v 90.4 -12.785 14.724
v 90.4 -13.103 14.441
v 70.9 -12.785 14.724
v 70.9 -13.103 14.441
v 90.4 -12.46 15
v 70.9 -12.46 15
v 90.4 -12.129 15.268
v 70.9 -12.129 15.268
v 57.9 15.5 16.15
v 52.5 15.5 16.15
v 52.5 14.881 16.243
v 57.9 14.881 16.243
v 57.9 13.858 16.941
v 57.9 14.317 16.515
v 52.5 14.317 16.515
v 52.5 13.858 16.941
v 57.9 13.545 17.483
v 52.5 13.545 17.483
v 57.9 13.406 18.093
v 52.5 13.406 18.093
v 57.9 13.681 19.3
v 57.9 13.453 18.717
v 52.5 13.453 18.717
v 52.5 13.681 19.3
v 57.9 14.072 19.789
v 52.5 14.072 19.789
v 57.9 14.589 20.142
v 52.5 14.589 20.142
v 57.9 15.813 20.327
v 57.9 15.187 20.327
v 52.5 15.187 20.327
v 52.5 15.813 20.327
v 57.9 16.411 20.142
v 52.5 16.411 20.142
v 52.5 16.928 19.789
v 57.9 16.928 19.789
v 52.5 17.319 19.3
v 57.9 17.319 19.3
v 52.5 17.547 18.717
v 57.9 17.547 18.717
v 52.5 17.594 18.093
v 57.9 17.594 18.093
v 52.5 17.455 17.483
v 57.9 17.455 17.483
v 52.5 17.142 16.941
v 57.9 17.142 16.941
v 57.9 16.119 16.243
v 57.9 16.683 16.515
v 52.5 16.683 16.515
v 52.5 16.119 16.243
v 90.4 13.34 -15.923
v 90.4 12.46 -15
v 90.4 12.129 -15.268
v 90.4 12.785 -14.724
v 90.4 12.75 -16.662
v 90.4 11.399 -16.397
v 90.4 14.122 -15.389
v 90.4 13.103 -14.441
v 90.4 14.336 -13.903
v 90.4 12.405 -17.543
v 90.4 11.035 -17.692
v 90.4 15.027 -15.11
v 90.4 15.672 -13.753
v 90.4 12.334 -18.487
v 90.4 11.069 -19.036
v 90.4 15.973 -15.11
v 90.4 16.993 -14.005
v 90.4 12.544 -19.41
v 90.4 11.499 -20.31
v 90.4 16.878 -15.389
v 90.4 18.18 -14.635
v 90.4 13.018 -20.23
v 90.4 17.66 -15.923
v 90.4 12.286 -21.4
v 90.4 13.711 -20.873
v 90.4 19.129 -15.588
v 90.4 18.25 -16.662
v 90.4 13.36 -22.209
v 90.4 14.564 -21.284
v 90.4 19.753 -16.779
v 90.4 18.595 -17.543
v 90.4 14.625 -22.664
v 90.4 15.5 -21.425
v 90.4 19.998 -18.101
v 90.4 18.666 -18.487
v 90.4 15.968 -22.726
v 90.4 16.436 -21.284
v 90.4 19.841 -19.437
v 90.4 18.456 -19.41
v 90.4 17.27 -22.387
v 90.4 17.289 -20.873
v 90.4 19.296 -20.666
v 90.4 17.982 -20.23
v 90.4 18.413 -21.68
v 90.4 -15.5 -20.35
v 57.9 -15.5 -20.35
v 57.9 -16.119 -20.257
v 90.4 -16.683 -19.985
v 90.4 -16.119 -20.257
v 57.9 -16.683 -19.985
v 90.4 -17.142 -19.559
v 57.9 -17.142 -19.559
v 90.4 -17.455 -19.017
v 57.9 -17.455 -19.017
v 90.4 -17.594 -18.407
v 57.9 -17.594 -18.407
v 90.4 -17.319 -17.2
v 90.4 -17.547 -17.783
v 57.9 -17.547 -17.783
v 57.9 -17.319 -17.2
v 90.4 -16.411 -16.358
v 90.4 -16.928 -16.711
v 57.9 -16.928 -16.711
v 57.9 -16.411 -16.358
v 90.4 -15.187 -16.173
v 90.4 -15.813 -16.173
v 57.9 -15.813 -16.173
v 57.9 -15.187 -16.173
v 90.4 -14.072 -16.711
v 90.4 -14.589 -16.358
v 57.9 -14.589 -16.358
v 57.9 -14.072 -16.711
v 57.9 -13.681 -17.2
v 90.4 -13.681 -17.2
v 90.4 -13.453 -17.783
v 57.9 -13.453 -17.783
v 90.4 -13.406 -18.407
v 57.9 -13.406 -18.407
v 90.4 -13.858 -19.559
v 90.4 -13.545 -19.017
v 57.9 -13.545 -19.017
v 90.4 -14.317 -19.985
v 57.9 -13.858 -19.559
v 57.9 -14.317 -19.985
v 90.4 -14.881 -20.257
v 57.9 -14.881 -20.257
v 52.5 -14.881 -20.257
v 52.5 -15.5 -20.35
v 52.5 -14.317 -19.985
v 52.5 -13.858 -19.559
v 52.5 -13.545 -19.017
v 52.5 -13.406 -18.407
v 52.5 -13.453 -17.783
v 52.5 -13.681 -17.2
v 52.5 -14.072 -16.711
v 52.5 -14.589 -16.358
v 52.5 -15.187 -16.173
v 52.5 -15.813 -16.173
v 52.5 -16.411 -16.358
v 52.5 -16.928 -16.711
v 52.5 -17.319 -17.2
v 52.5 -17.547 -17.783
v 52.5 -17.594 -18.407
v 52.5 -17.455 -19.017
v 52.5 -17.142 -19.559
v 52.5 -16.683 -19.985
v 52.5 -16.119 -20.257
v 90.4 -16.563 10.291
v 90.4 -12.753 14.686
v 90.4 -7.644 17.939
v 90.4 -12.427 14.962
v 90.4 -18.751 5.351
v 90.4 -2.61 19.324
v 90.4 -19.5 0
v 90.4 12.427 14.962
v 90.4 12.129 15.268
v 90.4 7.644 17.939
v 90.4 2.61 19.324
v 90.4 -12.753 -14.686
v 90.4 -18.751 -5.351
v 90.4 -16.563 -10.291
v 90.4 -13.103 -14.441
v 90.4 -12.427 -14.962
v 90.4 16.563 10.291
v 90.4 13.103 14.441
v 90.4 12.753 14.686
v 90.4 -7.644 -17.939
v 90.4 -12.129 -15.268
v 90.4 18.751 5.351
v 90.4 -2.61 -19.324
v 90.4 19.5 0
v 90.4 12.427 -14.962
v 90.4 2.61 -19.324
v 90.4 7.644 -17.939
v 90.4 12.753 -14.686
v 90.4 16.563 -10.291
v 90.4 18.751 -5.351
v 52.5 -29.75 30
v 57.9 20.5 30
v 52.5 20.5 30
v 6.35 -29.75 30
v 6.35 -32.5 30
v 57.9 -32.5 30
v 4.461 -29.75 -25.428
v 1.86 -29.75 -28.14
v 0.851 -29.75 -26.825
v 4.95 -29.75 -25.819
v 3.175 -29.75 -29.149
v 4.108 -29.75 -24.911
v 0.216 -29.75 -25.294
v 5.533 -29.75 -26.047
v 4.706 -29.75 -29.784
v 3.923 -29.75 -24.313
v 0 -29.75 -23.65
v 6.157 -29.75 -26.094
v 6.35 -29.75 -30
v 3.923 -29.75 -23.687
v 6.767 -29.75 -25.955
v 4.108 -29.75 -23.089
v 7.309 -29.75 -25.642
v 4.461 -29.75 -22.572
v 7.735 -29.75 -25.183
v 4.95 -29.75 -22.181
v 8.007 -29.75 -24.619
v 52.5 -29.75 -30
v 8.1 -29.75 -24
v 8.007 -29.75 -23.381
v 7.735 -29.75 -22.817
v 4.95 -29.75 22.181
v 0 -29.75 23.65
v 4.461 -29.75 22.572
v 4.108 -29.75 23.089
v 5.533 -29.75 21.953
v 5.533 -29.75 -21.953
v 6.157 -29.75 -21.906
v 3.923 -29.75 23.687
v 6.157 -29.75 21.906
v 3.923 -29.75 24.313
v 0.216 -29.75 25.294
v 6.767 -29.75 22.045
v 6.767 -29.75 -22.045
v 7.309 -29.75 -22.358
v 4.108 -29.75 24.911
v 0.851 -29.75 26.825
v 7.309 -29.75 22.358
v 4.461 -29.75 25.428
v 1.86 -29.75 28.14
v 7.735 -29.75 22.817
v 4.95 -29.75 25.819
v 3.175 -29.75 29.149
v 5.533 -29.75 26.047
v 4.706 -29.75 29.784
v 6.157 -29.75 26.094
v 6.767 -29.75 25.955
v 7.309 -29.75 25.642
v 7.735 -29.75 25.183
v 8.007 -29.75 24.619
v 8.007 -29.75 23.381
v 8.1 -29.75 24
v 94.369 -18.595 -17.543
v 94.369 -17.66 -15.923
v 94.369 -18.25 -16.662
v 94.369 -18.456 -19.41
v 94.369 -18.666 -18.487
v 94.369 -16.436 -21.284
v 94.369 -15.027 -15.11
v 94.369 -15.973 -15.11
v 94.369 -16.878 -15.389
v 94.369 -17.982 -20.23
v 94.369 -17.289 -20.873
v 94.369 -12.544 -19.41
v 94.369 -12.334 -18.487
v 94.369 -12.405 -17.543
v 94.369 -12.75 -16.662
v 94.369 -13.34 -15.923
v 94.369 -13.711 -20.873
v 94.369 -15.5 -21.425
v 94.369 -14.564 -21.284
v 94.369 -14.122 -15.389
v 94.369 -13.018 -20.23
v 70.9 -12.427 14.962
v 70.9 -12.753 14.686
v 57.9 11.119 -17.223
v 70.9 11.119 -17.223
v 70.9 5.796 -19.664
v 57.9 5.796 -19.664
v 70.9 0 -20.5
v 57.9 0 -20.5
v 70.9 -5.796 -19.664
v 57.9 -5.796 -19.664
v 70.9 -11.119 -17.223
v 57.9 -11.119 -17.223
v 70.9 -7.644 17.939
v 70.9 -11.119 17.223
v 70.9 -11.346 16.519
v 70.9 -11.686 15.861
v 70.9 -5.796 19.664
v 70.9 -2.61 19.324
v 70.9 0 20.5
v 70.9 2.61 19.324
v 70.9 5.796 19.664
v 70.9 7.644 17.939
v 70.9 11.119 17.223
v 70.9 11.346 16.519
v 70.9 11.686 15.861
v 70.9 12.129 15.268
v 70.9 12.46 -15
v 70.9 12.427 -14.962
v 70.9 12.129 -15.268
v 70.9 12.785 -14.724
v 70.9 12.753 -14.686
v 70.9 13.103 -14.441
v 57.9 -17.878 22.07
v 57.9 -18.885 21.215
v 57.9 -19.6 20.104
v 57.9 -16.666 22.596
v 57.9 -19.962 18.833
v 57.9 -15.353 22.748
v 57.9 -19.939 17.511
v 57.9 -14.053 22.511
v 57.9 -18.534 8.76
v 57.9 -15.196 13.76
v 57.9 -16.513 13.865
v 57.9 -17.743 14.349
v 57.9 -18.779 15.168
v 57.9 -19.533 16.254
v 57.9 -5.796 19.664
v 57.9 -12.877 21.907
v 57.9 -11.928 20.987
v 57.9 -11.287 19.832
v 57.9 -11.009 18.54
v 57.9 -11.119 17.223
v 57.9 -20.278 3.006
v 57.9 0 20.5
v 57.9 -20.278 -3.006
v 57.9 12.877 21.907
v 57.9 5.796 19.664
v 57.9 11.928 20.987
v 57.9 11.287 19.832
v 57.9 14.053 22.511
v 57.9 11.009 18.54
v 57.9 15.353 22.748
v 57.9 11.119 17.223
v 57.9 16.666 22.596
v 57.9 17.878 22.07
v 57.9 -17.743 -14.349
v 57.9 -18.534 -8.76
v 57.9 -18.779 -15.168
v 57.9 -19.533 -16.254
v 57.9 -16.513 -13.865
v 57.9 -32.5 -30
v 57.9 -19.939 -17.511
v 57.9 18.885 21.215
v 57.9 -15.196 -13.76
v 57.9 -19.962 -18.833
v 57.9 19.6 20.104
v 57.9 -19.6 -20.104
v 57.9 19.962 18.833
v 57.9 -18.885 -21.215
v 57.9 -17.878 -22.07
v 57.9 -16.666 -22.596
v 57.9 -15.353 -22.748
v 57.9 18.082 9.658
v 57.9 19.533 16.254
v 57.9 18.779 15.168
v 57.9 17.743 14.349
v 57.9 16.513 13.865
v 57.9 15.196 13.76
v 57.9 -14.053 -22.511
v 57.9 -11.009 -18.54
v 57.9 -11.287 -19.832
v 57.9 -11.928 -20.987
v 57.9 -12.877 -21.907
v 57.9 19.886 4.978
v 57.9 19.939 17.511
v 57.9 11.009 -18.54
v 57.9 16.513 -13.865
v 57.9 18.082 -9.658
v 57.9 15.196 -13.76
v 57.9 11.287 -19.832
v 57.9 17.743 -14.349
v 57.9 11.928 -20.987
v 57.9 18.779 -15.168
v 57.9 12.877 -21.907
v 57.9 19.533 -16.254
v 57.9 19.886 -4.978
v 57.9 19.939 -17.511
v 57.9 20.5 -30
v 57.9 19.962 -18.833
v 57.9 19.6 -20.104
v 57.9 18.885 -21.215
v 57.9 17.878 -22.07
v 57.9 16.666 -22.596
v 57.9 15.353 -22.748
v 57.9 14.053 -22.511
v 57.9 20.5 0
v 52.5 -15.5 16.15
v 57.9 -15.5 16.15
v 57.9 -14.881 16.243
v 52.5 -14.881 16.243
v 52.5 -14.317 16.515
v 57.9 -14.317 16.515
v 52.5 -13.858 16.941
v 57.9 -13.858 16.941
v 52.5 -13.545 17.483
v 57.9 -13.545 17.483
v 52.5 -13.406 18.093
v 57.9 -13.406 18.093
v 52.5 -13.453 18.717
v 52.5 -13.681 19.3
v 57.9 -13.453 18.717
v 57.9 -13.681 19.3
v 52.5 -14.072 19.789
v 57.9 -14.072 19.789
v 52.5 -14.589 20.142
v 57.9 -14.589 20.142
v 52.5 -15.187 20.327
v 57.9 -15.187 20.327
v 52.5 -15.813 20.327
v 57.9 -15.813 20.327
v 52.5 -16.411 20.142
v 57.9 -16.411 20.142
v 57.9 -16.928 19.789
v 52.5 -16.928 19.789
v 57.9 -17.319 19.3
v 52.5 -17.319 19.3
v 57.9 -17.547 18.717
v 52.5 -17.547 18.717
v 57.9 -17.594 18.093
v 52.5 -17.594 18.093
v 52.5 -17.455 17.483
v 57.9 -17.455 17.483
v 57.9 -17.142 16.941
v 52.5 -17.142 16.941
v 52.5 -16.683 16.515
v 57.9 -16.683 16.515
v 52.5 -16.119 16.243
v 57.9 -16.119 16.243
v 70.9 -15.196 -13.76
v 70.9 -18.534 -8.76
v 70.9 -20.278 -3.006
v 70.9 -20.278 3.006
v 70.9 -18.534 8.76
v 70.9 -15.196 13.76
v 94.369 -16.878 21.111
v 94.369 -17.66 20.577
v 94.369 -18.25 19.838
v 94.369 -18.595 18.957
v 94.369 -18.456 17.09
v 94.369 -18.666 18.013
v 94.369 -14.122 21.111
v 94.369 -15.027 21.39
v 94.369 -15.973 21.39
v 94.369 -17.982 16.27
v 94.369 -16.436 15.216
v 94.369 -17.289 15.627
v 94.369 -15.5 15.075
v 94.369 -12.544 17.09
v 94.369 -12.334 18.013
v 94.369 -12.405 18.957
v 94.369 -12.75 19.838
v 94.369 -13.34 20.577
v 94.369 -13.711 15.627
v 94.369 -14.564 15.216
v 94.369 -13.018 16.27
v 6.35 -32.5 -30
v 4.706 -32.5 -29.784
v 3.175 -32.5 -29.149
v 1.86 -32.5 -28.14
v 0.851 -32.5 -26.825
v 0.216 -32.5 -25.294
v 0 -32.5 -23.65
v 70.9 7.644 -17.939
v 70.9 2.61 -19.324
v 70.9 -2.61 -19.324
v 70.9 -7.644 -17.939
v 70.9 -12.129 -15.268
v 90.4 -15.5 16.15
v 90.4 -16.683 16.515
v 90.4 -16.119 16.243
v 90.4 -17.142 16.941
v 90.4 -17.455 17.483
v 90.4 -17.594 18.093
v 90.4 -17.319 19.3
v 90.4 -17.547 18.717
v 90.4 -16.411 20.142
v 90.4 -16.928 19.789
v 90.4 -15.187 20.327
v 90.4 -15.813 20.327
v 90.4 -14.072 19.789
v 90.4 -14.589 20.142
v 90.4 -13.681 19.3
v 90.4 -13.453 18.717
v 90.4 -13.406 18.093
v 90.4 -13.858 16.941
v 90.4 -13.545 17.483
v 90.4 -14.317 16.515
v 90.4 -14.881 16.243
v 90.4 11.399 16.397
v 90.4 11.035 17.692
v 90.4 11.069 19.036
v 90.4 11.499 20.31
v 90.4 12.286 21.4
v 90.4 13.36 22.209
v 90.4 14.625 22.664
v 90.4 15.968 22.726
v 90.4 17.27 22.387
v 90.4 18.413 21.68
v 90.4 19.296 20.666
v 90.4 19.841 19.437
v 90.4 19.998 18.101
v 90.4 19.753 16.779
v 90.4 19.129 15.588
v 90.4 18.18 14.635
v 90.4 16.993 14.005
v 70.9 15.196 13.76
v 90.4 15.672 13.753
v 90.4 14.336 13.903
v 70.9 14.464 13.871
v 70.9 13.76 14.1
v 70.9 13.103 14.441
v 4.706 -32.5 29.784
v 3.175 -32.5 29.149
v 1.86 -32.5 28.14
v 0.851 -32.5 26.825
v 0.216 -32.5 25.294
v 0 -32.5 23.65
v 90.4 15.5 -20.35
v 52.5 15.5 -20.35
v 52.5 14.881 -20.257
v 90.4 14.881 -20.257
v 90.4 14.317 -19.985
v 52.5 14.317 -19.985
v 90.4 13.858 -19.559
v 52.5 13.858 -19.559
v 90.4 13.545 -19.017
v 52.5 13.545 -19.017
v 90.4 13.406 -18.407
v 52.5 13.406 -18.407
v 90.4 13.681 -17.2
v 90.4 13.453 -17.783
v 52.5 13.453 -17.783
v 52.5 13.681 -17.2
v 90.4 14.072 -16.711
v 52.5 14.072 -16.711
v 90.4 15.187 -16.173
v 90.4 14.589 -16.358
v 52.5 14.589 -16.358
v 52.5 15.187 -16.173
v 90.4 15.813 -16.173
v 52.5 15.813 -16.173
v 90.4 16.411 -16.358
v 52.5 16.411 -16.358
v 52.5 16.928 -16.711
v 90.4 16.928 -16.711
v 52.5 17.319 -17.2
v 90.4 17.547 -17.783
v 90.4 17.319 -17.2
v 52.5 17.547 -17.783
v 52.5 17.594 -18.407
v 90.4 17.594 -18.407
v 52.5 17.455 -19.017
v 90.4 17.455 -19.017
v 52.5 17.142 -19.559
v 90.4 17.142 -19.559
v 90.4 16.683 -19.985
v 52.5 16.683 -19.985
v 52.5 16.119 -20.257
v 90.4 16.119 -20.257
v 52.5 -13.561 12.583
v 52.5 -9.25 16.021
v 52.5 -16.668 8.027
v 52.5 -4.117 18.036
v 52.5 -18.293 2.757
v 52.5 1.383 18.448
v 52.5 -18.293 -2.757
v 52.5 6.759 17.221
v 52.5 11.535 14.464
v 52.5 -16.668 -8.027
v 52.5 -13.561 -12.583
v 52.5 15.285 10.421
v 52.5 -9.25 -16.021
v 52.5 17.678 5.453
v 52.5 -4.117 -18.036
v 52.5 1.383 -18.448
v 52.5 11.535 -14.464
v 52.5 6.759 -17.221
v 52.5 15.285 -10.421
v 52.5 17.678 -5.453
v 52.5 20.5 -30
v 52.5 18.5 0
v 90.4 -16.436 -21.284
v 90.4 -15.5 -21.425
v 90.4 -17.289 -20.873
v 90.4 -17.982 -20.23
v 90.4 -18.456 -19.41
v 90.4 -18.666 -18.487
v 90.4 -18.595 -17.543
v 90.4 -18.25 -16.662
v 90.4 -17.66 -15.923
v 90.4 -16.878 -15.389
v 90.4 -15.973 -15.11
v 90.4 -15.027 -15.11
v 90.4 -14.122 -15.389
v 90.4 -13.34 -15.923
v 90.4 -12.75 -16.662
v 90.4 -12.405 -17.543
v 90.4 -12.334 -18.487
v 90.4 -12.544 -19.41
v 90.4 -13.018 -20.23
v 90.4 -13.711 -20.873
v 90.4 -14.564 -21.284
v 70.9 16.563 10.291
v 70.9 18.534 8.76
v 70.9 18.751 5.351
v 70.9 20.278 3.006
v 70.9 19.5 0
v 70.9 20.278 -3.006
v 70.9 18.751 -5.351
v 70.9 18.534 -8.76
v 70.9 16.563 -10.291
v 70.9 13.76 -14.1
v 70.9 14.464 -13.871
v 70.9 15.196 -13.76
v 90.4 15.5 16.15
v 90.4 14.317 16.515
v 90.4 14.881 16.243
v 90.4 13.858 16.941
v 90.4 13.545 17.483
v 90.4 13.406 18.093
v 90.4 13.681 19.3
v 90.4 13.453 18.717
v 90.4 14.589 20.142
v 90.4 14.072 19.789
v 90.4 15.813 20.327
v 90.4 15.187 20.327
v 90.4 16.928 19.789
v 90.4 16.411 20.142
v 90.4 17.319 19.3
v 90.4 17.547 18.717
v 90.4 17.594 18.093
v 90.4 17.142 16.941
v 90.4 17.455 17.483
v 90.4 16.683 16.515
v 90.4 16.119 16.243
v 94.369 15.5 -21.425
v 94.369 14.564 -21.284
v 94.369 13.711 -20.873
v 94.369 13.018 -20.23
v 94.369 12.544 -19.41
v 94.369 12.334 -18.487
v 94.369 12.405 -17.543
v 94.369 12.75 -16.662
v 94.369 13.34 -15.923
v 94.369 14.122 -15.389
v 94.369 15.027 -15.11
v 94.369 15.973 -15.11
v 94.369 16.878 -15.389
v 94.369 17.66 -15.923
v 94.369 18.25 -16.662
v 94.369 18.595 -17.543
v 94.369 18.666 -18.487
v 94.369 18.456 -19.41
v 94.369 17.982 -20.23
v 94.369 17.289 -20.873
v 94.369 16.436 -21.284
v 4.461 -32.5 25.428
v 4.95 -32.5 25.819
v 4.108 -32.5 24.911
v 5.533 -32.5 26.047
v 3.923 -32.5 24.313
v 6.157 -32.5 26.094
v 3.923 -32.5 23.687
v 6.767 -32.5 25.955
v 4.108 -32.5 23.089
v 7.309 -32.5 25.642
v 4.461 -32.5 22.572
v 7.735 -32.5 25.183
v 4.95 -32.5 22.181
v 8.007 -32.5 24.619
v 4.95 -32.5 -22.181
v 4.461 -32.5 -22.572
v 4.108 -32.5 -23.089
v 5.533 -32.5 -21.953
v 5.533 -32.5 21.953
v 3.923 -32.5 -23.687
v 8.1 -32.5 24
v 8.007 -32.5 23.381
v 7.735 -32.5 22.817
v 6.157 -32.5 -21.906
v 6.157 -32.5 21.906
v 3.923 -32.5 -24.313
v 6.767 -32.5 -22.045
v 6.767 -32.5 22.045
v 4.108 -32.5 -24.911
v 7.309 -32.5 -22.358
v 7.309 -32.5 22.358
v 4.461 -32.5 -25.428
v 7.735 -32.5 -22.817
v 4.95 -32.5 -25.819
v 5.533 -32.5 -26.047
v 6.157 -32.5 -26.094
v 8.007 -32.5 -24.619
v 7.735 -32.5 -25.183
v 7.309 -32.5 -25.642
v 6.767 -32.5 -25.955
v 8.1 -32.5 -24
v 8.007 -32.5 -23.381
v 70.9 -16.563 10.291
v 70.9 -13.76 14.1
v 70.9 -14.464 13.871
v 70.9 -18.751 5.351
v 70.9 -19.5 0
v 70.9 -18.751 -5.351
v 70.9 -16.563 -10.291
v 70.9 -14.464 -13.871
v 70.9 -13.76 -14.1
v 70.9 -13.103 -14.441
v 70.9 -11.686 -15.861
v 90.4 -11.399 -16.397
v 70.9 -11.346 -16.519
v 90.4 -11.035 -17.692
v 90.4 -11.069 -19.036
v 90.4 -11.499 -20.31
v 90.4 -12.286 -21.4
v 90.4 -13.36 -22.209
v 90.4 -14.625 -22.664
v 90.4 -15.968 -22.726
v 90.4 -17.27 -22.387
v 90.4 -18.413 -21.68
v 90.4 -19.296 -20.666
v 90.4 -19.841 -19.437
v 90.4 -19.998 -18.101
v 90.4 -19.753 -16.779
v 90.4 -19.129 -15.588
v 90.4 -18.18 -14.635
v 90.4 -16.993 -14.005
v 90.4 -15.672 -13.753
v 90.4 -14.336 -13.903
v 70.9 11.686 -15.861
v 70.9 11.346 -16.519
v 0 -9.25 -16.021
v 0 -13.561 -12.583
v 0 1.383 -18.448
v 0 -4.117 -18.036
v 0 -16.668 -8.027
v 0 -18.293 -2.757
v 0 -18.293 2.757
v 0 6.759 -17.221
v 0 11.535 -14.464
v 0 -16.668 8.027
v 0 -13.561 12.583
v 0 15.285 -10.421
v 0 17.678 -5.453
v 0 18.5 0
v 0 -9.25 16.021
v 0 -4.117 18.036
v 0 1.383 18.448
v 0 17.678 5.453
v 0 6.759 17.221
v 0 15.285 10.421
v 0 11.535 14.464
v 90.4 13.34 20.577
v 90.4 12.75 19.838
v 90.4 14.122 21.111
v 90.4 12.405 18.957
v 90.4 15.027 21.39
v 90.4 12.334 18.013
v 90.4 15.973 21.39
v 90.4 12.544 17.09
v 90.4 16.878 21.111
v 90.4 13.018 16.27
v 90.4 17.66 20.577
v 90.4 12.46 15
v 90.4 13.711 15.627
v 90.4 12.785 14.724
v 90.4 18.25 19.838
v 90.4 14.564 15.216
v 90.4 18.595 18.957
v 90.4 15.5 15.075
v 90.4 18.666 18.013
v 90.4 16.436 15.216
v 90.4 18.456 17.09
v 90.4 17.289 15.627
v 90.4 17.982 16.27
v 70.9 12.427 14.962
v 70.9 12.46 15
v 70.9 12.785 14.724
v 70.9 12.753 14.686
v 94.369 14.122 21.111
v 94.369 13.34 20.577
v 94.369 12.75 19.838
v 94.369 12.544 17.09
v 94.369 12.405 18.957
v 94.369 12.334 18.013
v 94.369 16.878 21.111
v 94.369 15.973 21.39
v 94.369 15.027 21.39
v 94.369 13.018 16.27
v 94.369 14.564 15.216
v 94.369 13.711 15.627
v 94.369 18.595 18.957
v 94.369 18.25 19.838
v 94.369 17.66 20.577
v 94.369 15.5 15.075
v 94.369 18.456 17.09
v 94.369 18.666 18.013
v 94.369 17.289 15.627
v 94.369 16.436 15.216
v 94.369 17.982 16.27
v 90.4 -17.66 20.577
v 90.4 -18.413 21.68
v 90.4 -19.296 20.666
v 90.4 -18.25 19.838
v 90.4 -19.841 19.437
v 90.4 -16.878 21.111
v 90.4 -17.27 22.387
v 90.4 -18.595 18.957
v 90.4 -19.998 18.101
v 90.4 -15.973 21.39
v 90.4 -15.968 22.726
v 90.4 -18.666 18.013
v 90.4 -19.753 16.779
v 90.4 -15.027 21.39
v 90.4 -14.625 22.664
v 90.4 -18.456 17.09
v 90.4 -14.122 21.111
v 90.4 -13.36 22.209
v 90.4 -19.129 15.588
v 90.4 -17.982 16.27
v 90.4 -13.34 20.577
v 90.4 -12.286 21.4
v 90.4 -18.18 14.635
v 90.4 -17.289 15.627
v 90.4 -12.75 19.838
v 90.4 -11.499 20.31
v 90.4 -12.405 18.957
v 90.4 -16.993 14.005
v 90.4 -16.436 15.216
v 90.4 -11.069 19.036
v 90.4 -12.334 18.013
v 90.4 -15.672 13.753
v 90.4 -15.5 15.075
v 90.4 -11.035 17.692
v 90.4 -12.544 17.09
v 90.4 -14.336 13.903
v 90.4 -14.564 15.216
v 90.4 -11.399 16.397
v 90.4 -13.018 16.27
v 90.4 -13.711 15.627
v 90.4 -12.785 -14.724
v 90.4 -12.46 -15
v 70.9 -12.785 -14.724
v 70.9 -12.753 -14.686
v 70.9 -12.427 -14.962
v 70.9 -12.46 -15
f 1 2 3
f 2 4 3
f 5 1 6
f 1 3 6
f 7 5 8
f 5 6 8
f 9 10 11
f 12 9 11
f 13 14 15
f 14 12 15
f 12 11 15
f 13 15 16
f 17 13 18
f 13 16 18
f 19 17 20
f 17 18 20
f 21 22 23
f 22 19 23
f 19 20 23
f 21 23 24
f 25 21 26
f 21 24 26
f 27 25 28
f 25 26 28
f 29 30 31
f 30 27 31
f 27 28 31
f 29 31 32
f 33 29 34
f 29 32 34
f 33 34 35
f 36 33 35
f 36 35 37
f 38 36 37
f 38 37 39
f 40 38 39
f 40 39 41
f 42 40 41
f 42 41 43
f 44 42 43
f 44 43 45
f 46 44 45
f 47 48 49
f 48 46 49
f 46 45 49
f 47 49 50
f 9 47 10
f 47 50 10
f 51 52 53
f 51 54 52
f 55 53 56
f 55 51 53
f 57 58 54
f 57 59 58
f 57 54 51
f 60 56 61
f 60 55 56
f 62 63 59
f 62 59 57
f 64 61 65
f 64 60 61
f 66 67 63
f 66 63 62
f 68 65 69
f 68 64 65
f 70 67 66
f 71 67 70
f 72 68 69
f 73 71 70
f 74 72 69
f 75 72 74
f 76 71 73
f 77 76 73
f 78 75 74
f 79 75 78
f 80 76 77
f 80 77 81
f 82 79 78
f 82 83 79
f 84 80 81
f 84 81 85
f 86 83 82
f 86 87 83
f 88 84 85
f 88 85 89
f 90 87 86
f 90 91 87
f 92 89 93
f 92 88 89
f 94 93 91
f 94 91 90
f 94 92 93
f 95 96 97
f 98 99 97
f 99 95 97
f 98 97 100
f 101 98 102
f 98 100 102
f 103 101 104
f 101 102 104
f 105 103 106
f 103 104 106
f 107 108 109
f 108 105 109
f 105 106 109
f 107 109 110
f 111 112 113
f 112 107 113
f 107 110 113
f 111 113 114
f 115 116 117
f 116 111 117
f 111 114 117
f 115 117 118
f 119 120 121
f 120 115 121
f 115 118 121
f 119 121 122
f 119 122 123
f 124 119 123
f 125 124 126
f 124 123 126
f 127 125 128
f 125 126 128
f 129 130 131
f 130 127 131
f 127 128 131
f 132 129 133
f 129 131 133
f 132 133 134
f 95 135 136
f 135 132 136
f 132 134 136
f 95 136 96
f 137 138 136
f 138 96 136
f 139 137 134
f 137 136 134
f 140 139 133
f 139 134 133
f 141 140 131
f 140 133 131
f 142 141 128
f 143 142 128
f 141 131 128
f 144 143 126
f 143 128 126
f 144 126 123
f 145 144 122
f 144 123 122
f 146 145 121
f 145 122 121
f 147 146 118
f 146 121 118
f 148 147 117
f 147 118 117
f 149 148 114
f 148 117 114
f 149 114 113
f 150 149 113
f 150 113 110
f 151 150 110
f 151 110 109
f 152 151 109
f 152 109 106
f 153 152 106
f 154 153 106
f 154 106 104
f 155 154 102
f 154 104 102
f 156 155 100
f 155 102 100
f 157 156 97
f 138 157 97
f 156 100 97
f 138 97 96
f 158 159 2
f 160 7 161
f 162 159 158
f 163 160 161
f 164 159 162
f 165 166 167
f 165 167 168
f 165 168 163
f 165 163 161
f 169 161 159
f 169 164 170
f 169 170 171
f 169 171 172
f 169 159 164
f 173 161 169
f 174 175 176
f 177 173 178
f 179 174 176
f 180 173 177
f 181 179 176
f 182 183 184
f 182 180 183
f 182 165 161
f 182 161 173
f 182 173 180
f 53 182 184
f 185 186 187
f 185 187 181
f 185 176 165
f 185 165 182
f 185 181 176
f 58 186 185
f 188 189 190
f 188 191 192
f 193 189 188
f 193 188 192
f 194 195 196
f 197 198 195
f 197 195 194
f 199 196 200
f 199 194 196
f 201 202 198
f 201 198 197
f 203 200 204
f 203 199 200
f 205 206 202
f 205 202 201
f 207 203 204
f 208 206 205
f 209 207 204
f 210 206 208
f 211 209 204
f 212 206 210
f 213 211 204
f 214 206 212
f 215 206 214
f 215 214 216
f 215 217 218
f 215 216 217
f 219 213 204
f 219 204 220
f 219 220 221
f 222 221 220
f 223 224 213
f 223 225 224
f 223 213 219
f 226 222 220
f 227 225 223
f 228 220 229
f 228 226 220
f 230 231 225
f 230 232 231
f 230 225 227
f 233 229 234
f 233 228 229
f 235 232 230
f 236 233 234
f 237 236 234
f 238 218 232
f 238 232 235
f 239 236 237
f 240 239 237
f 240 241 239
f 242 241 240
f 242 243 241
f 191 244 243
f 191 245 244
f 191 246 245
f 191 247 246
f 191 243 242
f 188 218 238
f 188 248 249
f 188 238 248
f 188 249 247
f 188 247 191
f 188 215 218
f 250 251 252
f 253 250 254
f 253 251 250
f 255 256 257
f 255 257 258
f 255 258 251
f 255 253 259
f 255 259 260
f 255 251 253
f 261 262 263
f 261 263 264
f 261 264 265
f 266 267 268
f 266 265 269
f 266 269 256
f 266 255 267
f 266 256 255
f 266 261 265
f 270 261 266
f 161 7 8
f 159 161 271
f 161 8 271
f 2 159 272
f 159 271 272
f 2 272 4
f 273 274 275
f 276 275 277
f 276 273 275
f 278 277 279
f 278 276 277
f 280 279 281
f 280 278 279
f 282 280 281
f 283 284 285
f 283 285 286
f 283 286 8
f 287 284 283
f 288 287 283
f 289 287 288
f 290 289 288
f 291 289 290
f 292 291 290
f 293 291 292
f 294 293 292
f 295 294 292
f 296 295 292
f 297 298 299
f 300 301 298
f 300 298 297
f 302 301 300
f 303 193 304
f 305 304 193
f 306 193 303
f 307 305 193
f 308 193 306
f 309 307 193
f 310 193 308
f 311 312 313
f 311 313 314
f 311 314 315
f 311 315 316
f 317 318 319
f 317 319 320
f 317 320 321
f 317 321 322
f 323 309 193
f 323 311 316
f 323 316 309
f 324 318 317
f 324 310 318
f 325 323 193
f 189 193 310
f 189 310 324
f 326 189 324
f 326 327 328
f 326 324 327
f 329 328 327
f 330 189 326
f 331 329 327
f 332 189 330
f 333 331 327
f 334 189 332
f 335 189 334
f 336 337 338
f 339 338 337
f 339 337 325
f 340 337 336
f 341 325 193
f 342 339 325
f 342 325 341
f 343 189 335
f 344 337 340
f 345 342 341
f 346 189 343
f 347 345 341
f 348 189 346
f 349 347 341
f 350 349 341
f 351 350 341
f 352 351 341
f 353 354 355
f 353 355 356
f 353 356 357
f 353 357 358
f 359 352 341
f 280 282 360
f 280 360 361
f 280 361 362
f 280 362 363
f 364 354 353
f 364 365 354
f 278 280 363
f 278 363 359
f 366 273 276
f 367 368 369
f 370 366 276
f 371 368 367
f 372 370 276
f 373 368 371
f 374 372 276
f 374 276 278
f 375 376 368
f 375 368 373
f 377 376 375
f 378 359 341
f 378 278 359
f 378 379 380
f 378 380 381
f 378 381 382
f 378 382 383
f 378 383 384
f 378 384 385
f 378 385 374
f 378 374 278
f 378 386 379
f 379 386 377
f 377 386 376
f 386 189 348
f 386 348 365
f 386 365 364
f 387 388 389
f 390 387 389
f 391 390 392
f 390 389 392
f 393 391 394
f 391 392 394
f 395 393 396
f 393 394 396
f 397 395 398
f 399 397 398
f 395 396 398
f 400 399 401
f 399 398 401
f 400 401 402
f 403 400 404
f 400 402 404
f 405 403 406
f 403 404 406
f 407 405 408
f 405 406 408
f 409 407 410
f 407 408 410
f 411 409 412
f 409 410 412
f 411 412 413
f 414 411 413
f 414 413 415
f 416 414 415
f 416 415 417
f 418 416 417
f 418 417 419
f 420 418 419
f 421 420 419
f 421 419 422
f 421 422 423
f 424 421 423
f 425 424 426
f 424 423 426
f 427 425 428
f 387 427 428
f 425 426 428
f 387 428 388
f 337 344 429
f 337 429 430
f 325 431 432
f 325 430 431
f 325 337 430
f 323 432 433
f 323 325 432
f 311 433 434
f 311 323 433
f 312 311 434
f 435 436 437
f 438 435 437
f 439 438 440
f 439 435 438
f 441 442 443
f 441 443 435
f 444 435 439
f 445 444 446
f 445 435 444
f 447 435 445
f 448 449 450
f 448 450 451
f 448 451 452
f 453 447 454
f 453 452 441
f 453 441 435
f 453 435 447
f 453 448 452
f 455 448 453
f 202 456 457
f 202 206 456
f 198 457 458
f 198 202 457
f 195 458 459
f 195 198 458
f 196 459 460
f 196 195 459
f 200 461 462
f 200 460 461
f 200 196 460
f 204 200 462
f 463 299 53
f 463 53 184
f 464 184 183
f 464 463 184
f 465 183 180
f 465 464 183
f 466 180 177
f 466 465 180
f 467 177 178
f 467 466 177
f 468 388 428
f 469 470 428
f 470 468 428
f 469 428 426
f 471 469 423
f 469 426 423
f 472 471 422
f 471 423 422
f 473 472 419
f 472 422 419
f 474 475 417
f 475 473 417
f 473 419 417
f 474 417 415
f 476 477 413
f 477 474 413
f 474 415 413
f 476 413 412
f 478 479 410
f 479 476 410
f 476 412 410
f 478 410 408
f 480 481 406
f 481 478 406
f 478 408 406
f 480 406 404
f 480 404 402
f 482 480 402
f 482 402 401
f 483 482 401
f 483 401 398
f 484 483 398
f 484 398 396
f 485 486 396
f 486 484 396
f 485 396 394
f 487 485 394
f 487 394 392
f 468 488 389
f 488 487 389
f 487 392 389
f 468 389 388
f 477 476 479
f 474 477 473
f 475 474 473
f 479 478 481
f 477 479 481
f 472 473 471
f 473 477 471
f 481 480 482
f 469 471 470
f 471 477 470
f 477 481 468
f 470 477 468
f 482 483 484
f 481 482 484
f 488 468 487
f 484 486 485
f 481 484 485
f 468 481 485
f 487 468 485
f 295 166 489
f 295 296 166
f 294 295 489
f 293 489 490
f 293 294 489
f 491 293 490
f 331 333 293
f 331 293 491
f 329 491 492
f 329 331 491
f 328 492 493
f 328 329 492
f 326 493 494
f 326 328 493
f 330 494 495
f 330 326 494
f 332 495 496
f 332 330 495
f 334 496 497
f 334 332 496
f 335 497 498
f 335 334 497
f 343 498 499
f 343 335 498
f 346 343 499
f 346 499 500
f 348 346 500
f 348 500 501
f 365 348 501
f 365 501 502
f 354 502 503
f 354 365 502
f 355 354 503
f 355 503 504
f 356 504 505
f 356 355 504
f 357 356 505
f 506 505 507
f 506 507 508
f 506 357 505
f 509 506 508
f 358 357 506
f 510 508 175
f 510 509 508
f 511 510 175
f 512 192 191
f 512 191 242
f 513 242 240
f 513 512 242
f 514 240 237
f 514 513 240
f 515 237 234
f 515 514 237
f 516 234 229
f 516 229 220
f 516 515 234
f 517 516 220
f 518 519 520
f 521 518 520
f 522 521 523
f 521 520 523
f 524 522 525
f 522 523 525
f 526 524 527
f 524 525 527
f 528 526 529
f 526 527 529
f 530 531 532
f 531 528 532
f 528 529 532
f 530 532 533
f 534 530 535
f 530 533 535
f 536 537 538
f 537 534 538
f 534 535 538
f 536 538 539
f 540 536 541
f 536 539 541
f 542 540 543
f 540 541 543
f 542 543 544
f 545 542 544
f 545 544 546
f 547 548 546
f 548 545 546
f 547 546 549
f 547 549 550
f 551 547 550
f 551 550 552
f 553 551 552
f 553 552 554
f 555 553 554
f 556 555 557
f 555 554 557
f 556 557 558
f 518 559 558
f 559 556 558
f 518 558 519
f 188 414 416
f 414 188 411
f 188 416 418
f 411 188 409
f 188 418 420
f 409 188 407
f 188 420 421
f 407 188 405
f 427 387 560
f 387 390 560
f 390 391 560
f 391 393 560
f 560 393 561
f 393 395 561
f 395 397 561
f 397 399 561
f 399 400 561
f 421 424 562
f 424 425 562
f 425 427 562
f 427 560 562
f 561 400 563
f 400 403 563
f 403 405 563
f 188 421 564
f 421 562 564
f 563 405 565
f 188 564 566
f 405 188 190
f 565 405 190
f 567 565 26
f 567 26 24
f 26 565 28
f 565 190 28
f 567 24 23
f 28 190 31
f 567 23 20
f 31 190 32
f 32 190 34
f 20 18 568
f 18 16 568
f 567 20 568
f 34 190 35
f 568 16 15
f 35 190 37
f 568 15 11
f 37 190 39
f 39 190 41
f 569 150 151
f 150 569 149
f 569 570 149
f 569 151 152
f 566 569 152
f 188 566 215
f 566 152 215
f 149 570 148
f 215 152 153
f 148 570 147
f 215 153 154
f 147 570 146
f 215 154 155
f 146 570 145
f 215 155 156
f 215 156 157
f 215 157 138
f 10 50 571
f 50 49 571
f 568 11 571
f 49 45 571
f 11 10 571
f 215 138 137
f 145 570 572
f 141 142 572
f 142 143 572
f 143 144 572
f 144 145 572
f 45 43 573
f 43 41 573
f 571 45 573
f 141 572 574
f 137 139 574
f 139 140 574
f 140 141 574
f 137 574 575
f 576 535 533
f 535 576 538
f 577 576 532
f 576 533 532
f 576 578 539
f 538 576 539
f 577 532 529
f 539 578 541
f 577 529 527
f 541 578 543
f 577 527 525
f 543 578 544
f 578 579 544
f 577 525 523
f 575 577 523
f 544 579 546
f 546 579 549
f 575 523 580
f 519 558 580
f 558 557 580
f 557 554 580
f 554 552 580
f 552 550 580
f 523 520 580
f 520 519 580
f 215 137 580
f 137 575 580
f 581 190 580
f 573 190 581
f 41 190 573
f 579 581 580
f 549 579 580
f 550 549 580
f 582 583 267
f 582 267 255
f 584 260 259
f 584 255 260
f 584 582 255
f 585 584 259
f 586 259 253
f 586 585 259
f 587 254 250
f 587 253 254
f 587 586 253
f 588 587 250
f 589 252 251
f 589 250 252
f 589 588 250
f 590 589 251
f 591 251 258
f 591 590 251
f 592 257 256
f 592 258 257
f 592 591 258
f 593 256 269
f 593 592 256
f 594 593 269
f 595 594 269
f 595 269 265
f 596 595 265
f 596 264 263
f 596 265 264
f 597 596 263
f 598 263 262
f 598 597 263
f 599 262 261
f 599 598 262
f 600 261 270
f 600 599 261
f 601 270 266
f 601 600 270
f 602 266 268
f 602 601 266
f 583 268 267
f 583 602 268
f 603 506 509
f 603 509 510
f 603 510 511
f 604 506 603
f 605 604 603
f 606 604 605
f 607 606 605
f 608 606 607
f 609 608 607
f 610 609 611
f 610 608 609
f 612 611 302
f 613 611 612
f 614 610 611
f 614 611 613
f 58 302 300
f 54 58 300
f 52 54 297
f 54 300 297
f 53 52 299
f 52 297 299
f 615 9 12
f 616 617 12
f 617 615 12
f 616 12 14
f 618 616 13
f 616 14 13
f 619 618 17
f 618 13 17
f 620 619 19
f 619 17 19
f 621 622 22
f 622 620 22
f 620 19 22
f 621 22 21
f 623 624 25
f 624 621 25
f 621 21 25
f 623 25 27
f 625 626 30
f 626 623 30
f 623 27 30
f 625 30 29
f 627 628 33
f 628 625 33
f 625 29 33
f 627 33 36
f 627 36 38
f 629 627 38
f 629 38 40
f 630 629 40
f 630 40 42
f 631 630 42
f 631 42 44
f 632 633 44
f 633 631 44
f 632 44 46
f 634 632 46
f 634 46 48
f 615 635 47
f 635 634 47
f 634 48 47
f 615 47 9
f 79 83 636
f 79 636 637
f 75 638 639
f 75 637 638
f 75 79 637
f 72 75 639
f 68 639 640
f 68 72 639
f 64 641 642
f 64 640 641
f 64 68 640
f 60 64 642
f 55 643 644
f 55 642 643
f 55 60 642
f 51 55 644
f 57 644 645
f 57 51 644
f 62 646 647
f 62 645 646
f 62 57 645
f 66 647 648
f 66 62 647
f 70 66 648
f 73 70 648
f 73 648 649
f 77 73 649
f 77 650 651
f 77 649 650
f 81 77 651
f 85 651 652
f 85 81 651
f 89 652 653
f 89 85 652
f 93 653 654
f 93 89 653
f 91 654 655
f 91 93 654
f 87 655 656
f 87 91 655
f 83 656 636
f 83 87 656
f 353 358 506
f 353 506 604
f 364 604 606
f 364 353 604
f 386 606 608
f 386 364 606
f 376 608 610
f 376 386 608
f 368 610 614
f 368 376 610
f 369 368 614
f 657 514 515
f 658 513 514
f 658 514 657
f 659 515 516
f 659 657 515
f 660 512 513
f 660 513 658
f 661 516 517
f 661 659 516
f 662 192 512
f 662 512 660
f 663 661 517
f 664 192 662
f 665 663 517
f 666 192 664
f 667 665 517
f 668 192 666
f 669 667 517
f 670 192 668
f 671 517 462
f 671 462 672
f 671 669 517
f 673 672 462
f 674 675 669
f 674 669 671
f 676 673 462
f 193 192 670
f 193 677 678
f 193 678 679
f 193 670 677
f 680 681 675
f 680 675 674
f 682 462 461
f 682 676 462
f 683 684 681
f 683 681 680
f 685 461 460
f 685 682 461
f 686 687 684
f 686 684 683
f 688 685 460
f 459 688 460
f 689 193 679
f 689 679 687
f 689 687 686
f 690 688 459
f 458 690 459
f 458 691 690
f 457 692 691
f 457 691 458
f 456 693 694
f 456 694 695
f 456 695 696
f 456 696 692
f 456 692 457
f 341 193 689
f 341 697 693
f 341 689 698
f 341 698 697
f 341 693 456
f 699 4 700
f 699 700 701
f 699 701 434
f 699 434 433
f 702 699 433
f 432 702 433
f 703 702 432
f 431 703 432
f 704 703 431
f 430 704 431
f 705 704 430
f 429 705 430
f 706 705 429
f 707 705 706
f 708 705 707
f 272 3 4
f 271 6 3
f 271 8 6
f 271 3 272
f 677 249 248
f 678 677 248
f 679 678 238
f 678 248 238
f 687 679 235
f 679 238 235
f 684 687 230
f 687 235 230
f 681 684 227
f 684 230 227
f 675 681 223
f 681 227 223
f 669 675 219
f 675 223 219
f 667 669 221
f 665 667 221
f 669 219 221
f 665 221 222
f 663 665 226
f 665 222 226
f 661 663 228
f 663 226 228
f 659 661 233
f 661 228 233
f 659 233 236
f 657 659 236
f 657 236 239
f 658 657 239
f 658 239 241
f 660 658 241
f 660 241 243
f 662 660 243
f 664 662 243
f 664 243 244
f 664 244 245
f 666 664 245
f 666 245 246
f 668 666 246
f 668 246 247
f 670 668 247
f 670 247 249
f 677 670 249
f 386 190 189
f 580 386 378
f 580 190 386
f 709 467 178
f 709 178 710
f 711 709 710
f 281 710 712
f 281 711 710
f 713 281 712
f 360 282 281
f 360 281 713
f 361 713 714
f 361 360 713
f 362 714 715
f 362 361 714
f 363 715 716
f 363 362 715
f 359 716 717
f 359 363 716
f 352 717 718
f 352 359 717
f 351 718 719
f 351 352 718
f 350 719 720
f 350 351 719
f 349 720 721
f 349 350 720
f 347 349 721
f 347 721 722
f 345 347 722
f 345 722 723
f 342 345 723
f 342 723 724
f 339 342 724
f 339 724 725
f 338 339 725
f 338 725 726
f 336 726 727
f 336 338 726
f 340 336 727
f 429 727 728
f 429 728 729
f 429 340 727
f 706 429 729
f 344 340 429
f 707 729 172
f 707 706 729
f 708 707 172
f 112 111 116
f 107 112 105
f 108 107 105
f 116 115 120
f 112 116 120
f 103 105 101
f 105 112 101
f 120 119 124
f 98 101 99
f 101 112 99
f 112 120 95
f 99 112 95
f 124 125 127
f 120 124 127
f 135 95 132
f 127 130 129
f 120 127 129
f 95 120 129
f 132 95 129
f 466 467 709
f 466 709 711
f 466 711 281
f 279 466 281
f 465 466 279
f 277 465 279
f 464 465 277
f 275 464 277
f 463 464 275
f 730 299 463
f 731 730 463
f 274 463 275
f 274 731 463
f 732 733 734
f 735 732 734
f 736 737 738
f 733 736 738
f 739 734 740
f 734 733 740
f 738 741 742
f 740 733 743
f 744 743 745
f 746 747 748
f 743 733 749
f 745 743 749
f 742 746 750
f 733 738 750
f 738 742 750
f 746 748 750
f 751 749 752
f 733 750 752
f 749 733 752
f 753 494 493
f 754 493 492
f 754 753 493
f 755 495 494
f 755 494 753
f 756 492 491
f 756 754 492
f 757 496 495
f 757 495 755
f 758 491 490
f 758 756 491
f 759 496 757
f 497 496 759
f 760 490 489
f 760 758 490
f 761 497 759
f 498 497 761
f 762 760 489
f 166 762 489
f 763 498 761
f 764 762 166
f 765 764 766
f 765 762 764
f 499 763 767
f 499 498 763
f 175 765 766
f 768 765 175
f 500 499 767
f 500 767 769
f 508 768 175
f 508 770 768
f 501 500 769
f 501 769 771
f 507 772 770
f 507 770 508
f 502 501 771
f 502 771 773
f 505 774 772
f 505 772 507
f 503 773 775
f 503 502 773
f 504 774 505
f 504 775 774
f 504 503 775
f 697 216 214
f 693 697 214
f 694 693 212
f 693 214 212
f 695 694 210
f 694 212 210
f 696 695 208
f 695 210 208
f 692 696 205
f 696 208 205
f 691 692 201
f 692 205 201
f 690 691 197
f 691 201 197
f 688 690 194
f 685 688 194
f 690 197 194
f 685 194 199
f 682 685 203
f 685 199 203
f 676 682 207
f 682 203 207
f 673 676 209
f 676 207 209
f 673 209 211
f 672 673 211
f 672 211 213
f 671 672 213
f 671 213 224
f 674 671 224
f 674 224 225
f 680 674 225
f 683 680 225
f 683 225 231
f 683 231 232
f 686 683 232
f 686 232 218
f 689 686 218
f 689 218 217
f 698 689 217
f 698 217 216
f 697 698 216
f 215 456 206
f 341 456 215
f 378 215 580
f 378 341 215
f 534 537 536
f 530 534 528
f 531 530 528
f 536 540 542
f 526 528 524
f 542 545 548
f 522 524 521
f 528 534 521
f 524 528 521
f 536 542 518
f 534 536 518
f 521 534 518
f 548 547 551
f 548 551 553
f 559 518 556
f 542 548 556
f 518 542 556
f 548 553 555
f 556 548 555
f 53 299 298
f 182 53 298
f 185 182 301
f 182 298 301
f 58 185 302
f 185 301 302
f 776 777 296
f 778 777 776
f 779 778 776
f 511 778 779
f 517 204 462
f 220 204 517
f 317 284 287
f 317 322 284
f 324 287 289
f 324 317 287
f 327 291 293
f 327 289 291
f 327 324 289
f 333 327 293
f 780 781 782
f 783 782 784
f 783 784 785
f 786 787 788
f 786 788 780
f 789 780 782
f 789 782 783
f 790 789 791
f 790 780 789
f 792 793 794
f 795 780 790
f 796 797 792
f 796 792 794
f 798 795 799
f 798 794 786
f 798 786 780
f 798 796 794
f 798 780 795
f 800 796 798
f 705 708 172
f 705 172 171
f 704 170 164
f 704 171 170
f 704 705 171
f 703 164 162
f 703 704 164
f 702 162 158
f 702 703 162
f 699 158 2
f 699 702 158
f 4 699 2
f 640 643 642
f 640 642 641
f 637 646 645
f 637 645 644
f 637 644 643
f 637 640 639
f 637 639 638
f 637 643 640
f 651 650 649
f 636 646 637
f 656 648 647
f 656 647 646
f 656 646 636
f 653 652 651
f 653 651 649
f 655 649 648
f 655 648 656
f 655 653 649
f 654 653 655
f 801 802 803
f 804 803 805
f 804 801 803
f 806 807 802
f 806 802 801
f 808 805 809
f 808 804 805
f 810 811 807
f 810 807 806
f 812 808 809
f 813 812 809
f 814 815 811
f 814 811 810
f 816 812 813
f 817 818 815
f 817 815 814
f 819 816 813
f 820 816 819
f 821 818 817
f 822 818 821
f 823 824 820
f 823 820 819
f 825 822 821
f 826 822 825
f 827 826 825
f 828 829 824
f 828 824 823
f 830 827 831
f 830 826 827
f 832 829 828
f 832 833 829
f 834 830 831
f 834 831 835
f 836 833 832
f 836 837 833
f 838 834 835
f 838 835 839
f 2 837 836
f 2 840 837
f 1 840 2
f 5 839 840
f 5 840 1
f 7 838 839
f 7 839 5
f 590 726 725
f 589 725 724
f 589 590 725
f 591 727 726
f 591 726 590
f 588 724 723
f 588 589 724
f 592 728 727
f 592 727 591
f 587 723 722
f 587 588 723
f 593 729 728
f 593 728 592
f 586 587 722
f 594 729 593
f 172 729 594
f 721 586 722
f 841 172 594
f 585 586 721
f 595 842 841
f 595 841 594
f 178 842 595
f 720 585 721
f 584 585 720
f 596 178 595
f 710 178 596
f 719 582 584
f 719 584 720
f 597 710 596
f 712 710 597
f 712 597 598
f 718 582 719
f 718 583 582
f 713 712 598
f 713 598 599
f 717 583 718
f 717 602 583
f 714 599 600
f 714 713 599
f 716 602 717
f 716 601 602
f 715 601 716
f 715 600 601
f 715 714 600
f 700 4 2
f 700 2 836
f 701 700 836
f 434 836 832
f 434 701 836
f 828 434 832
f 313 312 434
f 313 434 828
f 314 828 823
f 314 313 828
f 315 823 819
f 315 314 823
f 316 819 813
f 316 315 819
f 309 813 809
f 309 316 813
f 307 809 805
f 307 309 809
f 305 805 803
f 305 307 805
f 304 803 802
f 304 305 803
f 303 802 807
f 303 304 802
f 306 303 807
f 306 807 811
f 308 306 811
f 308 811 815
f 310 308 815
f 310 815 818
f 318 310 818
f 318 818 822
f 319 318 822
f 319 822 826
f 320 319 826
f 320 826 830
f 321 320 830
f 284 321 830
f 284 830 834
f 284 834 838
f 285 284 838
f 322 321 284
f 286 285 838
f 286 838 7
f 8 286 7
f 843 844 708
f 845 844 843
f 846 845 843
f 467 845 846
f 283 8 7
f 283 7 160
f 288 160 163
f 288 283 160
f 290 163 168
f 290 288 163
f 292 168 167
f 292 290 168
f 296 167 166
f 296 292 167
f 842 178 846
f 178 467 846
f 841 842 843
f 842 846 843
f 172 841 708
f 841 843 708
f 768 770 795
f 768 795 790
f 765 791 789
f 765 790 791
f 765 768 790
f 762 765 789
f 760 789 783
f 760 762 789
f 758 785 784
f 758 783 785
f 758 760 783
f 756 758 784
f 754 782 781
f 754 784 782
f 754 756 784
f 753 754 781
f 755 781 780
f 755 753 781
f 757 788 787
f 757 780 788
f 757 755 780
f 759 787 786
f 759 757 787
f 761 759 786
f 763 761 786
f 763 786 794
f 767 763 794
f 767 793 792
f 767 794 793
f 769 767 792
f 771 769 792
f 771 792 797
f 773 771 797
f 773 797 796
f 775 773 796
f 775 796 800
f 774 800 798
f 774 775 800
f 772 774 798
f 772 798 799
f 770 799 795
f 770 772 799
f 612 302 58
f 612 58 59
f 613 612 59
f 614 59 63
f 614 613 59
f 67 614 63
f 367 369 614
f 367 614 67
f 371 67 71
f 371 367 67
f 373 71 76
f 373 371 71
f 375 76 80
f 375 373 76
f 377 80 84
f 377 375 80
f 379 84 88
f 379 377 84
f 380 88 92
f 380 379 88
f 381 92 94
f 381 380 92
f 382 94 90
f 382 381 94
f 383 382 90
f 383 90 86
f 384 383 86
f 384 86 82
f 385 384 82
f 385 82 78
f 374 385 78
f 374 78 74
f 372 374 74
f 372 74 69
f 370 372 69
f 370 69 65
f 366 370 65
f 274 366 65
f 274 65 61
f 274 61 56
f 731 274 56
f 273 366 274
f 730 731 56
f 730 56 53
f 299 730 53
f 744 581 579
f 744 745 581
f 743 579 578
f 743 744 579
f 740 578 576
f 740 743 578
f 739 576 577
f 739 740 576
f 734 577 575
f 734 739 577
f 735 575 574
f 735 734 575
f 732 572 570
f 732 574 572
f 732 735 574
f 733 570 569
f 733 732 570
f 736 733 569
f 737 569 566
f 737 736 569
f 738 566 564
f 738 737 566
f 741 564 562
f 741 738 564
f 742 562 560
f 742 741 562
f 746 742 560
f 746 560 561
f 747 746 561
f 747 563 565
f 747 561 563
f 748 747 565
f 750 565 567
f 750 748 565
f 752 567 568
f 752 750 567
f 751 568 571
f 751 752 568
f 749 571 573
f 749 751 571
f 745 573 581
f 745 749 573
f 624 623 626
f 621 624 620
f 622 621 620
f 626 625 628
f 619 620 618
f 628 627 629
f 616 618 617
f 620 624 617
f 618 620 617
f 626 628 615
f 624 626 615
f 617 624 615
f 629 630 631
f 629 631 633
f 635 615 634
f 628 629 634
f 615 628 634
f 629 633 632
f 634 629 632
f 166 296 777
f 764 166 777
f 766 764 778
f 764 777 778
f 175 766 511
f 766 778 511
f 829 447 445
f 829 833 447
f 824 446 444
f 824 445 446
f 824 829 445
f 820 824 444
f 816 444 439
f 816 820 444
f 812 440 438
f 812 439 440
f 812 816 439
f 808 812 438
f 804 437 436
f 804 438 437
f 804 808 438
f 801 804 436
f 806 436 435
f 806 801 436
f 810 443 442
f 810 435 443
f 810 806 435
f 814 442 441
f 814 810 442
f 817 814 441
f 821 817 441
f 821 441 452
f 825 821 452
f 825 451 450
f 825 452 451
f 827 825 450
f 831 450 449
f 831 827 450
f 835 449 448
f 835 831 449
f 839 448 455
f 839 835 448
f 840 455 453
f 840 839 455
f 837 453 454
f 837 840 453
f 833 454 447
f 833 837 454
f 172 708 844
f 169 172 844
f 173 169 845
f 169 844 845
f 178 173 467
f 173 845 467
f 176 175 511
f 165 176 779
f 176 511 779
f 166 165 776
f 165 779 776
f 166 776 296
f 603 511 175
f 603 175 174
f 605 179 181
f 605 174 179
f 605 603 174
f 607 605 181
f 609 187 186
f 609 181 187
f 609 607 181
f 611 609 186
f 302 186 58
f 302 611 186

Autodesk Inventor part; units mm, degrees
ref_plane "YZ Plane" through (0, 0, 0) normal (1, 0, 0) x (0, 1, 0)
ref_plane "XZ Plane" through (0, 0, 0) normal (0, 1, 0) x (-1, 0, 0)
ref_plane "XY Plane" through (0, 0, 0) normal (0, 0, 1) x (1, 0, 0)
sketch "Sketch1" plane through (0, 0, 0) normal (1, 0, 0) x (0, 1, 0)
  circle A0 centre (0, 0) radius 18.5
  dimension "d0" = 37
extrude "Extrusion1" add sketch "Sketch1" along normal blind 52.5
sketch "Sketch2" plane through (52.5, 0, 0) normal (1, 0, 0) x (0, 0, -1)
  circle A0 centre (0, 0) radius 18.5 projected
  line L0 (0, 18.5) -> (0, 15.5) construction
  line L1 (0, 15.5) -> (18.25, 15.5) construction
  line L2 (0, 15.5) -> (-18.25, 15.5) construction
  circle A1 centre (18.25, 15.5) radius 2.1
  circle A2 centre (-18.25, 15.5) radius 2.1
  line L3 (0, 15.5) -> (0, 20.5) construction
  line L4 (0, 20.5) -> (30, 20.5) construction
  line L5 (0, 20.5) -> (-30, 20.5) construction
  line L6 (-30, 20.5) -> (30, 20.5)
  line L7 (30, 20.5) -> (30, -32.5)
  line L8 (30, -32.5) -> (-30, -32.5)
  line L9 (-30, -32.5) -> (-30, 20.5)
  dimension "d3" = 3
  dimension "d4" = 18.25
  dimension "d5" = 4.2
  dimension "d6" = 5
  dimension "d7" = 30
  dimension "d8" = 53
extrude "Extrusion2" add sketch "Sketch2" along normal blind 5.4 contours A0 | L6 L7 L8 L9
sketch "Sketch3" plane through (52.5, 0, 0) normal (-1, 0, 0) x (0, 0, 1)
  line L0 (30, 20.5) -> (30, -32.5) projected
  line L1 (-30, -32.5) -> (-30, 20.5) projected
  line L2 (30, -32.5) -> (-30, -32.5)
  line L3 (-30, -32.5) -> (-30, -29.75)
  line L4 (-30, -29.75) -> (30, -29.75)
  line L5 (30, -29.75) -> (30, -32.5)
  point P0 (0, 0)
  dimension "d11" = 2.75
extrude "Extrusion3" add sketch "Sketch3" along normal blind 52.5
sketch "Sketch4" plane through (57.9, 0, 0) normal (1, 0, 0) x (0, 0, -1)
  circle A0 centre (-18.25, 15.5) radius 2.1 projected
  circle A1 centre (18.25, 15.5) radius 2.1 projected
  circle A2 centre (0, 0) radius 18.5 construction
  line L0 (0, 0) -> (11.8041, 0) construction
  circle A3 centre (-18.25, -15.5) radius 2.1
  circle A4 centre (18.25, -15.5) radius 2.1
extrude "Extrusion4" cut sketch "Sketch4" against normal through all contours A3 | A4
sketch "Sketch5" plane through (52.5, -29.75, 30) normal (0, 1, 0) x (1, 0, 0)
  line L0 (-52.5, 0) -> (-52.5, 60) construction
  line L1 (-52.5, 0) -> (-46.5, 0) construction
  line L2 (0, 0) -> (-52.5, 0) construction
  line L3 (-46.5, 0) -> (-46.5, 6) construction
  circle A0 centre (-46.5, 6) radius 2.1
  line L4 (-52.5, 30) -> (-49.5, 30) construction
  line L5 (-52.5, 30) -> (-49.5, 30) construction
  circle A1 centre (-46.5, 54) radius 2.1
  dimension "d16" = 6
  dimension "d17" = 6
  dimension "d18" = 4.2
  dimension "d19" = 0
extrude "Extrusion5" cut sketch "Sketch5" against normal through all
fillet "Fillet1" radius 6.35 2 edges at (0, -31.125, 30) (0, -31.125, -30)
sketch "Sketch6" plane through (57.9, 0, 0) normal (1, 0, 0) x (0, 0, -1)
  circle A0 centre (-18.25, 15.5) radius 2.1 projected
  circle A1 centre (18.25, 15.5) radius 2.1 projected
  circle A2 centre (18.25, -15.5) radius 2.1 projected
  circle A3 centre (-18.25, -15.5) radius 2.1 projected
  line L0 (-18.25, 15.5) -> (18.25, -15.5) construction
  circle A4 centre (0, 0) radius 19.5
  circle A5 centre (-18.25, 15.5) radius 4.5
  circle A6 centre (18.25, 15.5) radius 4.5
  circle A7 centre (18.25, -15.5) radius 4.5
  circle A8 centre (-18.25, -15.5) radius 4.5
  point P0 (-15.2684, -12.1295)
  point P1 (-14.4413, -13.1034)
  point P2 (14.4413, -13.1034)
  point P3 (15.2684, -12.1295)
  point P4 (15.2684, 12.1295)
  point P5 (14.4413, 13.1034)
  point P6 (-14.4413, 13.1034)
  point P7 (-15.2684, 12.1295)
  dimension "d23" = 39
  dimension "d24" = 9
  dimension "d25" = 9
  dimension "d26" = 9
  dimension "d27" = 9
extrude "Extrusion6" add sketch "Sketch6" along normal blind 32.5 contours A4 A7 A8 A5 A6 | A4 A6 | A7 A4 | A4 A5 | A8 A4 picked at (21.8842, 16.0341) picked at (21.8842, -16.0341) picked at (-14.6159, 16.0344) picked at (-14.6159, -16.0344)
sketch "Sketch7" plane through (57.9, 0, 0) normal (1, 0, 0) x (0, 0, -1)
  circle A0 centre (0, 0) radius 18.5 projected
  circle A1 centre (0, 0) radius 20.5
extrude "Extrusion7" add sketch "Sketch7" along normal blind 13
sketch "Sketch8" plane through (90.4, 0, 0) normal (1, 0, 0) x (0, 0, -1)
  circle A0 centre (-18.25, 15.5) radius 2.1 projected
  circle A1 centre (-18.25, 15.5) radius 3.175
  circle A2 centre (18.25, 15.5) radius 2.1 projected
  circle A3 centre (18.25, 15.5) radius 3.175
  line L0 (0, 0) -> (9.867, 0) construction
  circle A4 centre (-18.25, -15.5) radius 3.175
  circle A5 centre (18.25, -15.5) radius 3.175
  dimension "d32" = 6.35
  dimension "d33" = 6.35
extrude "Extrusion8" add sketch "Sketch8" along normal blind 3.9688 contours A0 | A1 | A2 | A3 | A4 | A5
sketch "Sketch9" plane through (57.9, -32.5, -30) normal (0, -1, 0) x (1, 0, 0)
  circle A0 centre (-51.9, 6) radius 2.1 construction
  circle A1 centre (-51.9, 54) radius 2.1 construction
  line L0 (-51.9, 6) -> (-51.9, 54) construction
  point P0 (-57.9, 30)
properties part number "Pump"
